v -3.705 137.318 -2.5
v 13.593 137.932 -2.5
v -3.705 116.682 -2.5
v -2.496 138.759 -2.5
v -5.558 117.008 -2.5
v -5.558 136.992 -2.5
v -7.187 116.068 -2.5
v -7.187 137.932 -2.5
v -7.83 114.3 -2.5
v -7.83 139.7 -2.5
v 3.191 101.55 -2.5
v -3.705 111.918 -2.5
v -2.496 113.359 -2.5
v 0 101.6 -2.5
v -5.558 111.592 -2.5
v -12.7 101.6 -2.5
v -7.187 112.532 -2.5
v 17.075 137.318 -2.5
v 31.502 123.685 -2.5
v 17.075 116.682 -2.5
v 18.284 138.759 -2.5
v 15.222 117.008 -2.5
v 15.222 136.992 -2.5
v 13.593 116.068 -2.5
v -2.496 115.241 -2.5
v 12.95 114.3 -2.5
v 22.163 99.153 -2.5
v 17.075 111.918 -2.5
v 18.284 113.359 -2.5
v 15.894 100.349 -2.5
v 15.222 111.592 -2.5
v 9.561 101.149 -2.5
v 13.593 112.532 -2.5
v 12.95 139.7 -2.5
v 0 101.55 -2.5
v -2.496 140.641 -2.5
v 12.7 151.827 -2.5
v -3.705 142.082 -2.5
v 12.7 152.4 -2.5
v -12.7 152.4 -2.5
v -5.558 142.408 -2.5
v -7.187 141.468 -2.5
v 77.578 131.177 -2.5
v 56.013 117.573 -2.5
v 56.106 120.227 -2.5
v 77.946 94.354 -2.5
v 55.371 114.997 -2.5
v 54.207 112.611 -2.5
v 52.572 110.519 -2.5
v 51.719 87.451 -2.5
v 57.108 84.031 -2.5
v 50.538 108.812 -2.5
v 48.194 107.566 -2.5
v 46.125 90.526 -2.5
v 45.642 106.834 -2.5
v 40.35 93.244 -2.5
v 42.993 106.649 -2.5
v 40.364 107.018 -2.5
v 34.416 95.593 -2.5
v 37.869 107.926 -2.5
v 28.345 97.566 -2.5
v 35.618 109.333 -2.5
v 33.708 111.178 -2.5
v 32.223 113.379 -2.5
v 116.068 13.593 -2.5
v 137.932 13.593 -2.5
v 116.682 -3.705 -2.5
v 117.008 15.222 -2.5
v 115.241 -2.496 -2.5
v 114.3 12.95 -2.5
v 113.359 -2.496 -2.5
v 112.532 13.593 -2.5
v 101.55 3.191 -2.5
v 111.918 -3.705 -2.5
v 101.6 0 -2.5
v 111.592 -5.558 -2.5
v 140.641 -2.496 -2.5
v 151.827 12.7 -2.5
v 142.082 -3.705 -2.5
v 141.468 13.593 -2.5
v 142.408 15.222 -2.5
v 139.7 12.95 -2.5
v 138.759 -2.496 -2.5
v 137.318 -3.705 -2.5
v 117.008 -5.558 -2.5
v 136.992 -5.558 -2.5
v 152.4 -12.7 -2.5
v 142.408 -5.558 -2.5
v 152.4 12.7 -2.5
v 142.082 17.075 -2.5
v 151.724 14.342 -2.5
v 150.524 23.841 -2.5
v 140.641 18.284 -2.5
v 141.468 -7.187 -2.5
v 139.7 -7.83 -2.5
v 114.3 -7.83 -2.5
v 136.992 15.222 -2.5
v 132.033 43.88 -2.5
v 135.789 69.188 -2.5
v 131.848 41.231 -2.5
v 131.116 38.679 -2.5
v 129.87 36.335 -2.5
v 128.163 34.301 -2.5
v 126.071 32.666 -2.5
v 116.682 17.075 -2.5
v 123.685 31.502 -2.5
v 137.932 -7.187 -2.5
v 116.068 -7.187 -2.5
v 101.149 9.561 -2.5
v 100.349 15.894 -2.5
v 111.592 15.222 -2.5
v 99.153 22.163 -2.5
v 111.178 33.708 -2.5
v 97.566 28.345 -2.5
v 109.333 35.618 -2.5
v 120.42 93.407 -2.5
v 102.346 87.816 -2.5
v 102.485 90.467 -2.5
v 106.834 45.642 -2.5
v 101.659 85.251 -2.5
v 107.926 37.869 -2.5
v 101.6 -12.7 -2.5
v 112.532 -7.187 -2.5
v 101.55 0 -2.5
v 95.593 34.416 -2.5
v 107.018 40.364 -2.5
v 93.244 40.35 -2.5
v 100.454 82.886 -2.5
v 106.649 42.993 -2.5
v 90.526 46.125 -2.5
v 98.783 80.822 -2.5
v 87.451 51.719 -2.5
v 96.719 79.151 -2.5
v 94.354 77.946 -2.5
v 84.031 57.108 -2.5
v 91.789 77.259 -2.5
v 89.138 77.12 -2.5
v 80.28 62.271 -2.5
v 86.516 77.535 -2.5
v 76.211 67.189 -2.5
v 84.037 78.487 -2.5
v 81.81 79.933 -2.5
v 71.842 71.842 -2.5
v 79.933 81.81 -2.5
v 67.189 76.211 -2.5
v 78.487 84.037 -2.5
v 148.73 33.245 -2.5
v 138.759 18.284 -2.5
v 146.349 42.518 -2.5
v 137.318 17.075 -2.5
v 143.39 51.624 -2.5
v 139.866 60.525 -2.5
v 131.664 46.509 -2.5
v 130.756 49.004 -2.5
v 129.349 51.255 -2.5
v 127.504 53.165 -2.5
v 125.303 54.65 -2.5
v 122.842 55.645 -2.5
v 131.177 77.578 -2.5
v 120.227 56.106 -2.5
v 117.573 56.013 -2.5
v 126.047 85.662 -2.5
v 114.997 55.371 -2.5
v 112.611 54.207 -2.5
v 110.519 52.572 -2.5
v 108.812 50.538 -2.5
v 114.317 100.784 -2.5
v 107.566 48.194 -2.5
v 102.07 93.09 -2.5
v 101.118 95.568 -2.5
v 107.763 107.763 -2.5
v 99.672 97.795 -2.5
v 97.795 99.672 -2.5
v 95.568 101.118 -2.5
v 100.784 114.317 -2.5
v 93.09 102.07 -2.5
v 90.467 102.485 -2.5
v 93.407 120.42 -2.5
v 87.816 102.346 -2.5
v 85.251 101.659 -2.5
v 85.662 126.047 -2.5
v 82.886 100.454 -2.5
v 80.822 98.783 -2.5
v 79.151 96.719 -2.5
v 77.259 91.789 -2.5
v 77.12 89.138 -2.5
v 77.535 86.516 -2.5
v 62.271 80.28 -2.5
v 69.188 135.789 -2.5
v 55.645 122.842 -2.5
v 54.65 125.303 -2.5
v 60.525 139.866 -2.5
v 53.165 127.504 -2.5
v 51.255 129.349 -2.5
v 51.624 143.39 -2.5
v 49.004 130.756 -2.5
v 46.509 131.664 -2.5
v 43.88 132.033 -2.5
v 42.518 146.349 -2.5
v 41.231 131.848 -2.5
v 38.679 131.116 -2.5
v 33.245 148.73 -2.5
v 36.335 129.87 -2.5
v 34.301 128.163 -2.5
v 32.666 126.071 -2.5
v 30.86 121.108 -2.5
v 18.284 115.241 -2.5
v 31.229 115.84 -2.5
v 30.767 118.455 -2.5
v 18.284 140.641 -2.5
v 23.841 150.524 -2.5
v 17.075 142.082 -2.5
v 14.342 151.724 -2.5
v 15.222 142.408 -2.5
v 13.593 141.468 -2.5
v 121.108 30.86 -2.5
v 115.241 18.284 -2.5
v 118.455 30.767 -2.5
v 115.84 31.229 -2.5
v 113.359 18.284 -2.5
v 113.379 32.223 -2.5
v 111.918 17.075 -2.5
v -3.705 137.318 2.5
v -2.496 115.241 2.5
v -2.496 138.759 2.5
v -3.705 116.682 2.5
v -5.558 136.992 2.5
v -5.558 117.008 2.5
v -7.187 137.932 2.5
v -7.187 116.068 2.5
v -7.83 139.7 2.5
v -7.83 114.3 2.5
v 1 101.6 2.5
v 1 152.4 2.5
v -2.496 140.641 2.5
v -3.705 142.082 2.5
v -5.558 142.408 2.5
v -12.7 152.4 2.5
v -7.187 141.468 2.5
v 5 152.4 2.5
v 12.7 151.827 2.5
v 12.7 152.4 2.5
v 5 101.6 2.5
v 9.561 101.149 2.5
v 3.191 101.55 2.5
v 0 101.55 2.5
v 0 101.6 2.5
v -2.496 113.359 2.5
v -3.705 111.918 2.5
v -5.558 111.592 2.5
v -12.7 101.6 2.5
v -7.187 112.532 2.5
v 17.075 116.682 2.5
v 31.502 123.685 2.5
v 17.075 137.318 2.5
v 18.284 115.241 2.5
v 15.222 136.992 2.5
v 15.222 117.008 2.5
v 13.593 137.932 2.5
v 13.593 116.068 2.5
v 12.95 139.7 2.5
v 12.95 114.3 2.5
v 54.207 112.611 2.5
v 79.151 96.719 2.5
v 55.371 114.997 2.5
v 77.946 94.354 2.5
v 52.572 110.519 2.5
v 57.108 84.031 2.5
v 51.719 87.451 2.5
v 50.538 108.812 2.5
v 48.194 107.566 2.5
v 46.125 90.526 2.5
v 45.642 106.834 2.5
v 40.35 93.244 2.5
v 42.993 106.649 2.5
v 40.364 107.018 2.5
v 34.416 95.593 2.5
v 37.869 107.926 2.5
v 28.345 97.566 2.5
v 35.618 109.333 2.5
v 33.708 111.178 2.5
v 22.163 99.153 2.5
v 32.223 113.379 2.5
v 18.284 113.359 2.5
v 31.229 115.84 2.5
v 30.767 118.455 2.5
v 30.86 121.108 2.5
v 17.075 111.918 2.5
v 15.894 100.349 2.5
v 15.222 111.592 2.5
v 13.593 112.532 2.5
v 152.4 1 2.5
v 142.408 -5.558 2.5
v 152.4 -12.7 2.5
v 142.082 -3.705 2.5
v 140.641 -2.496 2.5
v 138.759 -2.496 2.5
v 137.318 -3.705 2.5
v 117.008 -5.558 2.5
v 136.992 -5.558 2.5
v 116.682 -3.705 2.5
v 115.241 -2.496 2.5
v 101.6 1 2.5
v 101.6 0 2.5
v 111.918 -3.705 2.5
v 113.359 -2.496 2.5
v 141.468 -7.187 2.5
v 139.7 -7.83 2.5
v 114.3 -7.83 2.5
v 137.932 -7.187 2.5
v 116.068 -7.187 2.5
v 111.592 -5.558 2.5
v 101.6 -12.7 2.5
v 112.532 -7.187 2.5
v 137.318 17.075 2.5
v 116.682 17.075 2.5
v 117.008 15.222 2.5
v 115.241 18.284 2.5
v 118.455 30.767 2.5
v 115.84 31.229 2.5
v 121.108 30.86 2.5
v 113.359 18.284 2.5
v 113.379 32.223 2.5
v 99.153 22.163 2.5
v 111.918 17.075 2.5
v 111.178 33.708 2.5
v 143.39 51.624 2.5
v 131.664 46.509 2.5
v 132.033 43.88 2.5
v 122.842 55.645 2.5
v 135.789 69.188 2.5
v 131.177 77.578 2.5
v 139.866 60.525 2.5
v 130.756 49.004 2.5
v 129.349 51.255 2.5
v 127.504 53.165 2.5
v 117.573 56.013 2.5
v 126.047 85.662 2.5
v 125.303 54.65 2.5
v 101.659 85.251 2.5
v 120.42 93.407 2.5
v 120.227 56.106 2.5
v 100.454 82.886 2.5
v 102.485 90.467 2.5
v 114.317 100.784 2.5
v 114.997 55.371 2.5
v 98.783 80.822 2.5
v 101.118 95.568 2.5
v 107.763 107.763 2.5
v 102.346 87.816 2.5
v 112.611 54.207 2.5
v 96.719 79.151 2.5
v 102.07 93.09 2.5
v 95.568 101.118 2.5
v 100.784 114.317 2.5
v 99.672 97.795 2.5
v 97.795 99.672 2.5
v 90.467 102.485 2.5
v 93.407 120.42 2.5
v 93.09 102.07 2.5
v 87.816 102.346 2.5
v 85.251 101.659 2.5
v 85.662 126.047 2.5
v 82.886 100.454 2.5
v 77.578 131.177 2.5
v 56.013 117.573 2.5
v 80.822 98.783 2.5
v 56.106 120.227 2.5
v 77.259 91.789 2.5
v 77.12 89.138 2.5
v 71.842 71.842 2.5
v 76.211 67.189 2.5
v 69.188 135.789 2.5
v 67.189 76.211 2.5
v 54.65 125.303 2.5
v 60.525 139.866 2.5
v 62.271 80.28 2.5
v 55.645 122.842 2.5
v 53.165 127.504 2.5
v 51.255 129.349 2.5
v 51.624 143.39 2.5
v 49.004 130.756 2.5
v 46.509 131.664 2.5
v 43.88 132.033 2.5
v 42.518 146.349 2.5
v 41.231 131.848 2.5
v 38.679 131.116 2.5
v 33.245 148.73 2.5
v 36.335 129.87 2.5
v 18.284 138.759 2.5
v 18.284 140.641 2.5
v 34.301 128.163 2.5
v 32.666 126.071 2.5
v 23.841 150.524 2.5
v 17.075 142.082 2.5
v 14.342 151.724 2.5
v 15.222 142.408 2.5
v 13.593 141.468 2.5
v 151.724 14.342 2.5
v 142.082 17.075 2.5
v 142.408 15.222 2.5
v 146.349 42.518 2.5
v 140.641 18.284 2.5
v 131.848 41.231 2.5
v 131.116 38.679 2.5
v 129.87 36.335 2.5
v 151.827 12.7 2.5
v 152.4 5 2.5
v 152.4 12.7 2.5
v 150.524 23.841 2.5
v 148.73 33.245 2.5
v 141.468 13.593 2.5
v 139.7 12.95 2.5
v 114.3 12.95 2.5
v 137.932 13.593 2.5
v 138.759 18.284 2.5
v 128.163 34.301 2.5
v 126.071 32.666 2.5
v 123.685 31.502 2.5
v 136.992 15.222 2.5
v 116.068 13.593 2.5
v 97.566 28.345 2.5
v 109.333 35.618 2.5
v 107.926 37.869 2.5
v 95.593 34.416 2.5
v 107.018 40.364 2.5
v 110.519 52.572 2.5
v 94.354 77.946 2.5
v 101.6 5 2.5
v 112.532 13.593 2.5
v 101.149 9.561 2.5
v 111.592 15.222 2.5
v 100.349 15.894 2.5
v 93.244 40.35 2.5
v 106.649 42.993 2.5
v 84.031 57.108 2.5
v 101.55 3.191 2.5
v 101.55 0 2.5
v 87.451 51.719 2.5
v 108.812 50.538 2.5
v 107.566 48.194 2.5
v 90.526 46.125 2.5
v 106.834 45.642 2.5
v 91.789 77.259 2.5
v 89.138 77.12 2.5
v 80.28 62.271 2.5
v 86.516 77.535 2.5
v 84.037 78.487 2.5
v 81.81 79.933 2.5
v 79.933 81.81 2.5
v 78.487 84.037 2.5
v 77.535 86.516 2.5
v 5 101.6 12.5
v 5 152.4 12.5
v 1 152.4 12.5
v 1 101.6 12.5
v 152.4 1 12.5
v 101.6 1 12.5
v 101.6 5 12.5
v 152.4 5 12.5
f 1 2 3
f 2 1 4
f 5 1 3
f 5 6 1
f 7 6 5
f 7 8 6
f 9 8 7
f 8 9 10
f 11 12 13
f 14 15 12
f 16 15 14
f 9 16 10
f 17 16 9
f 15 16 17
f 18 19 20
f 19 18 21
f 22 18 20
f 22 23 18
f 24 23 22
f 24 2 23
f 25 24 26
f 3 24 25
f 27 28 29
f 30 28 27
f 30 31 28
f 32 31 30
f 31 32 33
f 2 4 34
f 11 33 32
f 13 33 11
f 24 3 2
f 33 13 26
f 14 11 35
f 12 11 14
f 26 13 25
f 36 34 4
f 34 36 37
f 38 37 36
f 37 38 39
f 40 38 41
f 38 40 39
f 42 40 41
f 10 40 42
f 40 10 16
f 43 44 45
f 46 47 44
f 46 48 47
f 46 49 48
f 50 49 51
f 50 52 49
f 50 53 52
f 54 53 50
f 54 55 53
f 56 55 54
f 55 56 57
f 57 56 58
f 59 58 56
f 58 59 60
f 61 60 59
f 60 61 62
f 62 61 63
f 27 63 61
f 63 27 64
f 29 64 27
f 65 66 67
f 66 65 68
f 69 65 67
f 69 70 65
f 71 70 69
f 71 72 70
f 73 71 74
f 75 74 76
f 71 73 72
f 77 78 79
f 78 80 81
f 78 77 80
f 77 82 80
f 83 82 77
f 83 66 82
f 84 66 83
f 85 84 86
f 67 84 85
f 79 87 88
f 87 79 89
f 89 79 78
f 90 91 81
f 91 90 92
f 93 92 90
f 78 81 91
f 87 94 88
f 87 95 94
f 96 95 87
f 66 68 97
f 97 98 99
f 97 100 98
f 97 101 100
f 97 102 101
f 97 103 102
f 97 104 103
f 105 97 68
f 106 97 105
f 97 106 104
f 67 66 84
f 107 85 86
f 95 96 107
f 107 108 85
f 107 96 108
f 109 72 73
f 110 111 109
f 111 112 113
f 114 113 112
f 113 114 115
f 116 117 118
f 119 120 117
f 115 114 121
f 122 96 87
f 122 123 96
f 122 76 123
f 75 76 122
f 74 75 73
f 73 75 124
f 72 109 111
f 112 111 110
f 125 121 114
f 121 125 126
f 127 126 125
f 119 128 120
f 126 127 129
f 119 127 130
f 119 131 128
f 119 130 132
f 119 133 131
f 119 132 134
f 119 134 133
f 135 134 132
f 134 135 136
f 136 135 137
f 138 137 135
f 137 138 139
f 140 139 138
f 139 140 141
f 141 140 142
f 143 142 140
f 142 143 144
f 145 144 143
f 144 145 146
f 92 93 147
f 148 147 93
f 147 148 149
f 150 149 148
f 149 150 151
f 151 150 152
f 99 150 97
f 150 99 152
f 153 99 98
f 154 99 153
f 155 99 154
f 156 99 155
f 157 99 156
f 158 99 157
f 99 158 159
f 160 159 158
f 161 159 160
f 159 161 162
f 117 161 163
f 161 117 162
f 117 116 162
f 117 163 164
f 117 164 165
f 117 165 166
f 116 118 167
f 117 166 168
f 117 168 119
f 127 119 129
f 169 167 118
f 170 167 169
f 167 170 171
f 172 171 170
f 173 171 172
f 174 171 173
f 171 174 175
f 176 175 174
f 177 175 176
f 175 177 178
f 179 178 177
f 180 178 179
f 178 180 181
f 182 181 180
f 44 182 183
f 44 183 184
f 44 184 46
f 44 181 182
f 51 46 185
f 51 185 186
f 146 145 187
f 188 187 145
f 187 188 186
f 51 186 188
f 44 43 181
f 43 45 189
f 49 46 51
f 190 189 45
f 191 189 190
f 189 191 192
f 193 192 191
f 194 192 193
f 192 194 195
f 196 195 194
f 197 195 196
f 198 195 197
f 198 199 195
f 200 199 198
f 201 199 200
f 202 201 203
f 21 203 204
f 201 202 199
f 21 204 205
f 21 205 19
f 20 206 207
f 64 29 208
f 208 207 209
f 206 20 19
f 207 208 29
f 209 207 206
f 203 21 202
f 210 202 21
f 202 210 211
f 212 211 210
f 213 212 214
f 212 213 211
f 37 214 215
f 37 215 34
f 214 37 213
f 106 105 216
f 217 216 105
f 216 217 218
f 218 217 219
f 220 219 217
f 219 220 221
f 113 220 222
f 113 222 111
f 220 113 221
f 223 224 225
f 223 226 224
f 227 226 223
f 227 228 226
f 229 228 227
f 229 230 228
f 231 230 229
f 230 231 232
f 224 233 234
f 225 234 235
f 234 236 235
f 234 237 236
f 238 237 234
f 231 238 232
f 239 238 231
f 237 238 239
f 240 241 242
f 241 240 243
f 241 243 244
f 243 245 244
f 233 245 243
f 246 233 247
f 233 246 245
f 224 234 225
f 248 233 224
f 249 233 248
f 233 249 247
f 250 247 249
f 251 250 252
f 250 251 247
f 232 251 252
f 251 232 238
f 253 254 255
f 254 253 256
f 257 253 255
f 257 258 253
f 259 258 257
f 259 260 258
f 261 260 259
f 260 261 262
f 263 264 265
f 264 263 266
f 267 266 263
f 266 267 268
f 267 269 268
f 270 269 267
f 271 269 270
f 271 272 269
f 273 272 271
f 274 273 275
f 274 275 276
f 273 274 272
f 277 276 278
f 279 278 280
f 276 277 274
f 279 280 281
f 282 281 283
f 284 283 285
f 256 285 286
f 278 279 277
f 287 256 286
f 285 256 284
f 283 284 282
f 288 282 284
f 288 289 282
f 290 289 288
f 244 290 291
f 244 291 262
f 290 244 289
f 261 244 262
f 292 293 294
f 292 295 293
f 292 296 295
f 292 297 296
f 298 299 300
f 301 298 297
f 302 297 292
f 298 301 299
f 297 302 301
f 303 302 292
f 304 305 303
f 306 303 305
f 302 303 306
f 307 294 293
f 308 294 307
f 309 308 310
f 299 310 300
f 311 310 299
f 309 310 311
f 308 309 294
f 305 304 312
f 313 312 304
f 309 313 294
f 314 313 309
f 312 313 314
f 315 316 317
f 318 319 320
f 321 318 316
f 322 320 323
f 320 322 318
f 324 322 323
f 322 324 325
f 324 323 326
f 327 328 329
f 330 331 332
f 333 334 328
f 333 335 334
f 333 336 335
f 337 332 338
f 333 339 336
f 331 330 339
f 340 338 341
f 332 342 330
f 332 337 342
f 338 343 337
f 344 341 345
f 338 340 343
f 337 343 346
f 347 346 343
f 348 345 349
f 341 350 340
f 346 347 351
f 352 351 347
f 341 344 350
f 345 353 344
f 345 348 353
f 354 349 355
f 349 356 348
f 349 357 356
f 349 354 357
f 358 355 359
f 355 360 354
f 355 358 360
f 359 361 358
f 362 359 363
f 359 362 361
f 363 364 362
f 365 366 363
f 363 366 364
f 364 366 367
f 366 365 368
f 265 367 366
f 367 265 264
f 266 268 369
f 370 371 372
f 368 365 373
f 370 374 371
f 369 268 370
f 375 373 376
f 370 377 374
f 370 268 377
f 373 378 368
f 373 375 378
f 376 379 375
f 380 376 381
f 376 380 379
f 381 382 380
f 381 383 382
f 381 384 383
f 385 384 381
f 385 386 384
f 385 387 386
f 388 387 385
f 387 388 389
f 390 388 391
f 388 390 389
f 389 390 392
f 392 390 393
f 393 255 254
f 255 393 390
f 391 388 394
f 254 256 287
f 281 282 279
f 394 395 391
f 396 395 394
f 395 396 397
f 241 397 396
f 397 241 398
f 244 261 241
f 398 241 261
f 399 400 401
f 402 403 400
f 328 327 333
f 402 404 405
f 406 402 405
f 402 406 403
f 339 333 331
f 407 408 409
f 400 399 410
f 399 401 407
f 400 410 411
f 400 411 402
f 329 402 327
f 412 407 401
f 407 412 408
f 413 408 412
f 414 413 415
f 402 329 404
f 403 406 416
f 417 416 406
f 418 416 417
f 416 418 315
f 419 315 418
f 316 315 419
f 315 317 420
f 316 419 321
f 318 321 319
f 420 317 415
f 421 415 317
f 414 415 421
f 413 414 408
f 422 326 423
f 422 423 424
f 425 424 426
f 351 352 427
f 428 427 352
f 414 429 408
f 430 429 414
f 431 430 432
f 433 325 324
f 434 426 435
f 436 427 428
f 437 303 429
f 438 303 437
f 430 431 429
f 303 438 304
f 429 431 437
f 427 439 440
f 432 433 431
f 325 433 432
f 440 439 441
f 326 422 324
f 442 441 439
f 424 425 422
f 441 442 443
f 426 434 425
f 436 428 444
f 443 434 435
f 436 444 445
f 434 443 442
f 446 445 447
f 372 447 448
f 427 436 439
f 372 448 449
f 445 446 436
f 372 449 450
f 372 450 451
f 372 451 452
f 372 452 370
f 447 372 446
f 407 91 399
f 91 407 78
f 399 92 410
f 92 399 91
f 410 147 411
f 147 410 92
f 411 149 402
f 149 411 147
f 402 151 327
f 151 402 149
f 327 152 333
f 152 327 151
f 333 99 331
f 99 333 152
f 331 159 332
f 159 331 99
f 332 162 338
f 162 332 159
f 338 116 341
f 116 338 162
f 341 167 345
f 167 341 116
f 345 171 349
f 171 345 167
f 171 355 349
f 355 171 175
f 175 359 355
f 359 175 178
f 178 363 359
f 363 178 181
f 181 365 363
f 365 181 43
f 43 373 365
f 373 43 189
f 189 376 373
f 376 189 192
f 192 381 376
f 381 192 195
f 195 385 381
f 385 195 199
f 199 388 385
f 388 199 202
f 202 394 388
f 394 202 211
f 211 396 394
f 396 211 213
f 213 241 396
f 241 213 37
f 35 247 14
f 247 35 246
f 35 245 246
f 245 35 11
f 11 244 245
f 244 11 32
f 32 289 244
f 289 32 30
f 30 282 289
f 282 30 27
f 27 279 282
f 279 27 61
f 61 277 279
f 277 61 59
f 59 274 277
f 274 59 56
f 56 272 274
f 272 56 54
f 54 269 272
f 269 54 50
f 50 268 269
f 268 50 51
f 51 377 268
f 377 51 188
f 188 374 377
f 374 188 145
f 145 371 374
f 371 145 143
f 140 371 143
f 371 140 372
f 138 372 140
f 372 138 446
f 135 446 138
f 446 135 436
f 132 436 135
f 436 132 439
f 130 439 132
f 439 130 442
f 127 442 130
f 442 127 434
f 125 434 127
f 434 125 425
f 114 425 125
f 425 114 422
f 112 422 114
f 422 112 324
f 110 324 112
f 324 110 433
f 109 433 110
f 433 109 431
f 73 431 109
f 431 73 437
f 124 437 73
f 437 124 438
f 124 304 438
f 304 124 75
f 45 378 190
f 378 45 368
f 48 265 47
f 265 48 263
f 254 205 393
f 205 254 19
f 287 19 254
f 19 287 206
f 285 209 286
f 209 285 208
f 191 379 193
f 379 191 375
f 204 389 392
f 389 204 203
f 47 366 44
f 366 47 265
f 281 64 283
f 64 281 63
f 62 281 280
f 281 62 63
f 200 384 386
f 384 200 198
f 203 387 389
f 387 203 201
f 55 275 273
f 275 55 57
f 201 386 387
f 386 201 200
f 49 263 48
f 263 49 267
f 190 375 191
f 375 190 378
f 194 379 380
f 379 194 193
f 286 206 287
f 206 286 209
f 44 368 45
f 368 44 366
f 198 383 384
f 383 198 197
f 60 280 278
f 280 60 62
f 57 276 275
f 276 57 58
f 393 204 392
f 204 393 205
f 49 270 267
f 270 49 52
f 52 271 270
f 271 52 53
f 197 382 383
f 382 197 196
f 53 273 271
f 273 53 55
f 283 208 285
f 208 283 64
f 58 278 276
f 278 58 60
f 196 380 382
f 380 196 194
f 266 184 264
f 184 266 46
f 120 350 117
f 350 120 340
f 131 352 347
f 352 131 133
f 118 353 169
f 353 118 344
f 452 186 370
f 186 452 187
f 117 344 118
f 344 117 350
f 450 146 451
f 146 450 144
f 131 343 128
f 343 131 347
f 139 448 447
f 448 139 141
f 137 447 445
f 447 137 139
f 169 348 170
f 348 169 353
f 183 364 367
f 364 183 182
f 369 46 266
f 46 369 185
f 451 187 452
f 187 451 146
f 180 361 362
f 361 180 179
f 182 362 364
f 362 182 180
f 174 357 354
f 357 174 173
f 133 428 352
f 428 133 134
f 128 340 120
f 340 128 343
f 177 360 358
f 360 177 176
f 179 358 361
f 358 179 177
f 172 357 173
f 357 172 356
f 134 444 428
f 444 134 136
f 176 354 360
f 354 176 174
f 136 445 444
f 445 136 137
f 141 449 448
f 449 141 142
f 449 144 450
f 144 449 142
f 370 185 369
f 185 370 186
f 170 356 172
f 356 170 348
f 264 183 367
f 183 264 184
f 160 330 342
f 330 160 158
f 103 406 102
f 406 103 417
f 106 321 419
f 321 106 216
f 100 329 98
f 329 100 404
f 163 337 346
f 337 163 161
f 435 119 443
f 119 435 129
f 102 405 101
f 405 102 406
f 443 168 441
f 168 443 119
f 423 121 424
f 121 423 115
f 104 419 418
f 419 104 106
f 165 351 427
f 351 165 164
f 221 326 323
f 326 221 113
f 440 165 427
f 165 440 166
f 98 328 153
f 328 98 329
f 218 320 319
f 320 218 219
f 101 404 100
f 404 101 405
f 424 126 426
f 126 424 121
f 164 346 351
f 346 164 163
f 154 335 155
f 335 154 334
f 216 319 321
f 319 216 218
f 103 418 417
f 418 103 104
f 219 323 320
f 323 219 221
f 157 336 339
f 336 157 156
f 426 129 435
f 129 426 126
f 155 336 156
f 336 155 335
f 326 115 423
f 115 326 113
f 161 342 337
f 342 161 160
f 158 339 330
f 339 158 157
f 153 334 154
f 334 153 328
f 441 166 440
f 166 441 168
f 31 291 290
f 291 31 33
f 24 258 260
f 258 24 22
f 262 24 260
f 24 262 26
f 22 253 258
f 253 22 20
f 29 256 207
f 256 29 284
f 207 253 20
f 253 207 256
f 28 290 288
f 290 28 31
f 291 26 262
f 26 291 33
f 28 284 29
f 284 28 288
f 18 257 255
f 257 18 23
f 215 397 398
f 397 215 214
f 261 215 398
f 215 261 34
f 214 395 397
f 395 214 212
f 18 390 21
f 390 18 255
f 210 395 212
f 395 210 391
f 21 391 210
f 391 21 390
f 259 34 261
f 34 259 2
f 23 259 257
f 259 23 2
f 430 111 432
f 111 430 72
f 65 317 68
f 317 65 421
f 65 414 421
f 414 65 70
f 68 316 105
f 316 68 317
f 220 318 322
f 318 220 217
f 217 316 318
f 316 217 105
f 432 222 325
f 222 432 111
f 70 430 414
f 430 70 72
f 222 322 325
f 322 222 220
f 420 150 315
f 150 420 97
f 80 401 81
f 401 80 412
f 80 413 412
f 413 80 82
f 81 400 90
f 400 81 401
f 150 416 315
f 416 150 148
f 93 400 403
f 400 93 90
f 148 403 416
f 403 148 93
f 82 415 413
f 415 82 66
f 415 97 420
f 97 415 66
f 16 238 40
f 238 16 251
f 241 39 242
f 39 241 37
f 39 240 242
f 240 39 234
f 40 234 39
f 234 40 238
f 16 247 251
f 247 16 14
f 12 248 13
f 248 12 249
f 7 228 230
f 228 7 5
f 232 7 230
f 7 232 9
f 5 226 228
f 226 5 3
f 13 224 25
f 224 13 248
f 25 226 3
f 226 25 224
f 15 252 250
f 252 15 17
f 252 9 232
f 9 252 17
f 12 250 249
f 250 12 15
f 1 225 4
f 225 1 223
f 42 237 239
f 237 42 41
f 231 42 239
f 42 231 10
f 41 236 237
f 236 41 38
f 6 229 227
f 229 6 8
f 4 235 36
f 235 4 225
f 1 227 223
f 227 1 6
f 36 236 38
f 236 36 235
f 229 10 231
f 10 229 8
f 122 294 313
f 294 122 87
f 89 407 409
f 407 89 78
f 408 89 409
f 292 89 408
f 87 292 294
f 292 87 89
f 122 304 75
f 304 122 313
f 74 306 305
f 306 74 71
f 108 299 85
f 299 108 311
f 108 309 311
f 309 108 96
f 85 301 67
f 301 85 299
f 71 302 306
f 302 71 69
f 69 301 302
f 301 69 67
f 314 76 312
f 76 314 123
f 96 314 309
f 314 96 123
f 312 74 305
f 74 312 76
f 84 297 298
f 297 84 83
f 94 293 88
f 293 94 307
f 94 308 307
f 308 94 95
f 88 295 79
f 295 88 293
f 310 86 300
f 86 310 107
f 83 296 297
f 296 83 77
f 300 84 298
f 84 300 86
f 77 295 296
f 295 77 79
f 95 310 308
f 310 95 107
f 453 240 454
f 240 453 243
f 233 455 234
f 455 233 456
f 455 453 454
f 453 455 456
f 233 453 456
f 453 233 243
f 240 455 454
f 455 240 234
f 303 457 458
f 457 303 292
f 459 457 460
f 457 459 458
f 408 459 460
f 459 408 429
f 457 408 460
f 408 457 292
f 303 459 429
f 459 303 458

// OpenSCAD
// Source
// https://www.thingiverse.com/thing:1092611/#files

inch = 25.4;
estowall = .067 * inch;
estosize = 1 * inch;
bsize=4;
strutsize=2;
struthole=strutsize * .25 * inch;
thickness=5;

module arc(radius, thickness, angle, fragments){
  $fn=fragments;
	intersection(){
		union(){
			rights = floor(angle/90);
			remain = angle-rights*90;
			if(angle > 90){
				for(i = [0:rights-1]){
					rotate(i*90-(rights-1)*90/2){
						polygon([[0, 0], [radius+thickness, (radius+thickness)*tan(90/2)], [radius+thickness, -(radius+thickness)*tan(90/2)]]);
					}
				}
				rotate(-(rights)*90/2)
					polygon([[0, 0], [radius+thickness, 0], [radius+thickness, -(radius+thickness)*tan(remain/2)]]);
				rotate((rights)*90/2)
					polygon([[0, 0], [radius+thickness, (radius+thickness)*tan(remain/2)], [radius+thickness, 0]]);
			}else{
				polygon([[0, 0], [radius+thickness, (radius+thickness)*tan(angle/2)], [radius+thickness, -(radius+thickness)*tan(angle/2)]]);
			}
		}
		difference(){
			circle(radius+thickness);
			circle(radius);
		}
	}
}

module brace_body(){
   rotate([0,0,45]) linear_extrude(height = thickness, center = true, convexity = 10, twist = 0) arc(bsize * inch ,strutsize * inch,90,100);
}

module mounting_ear(){
    difference(){
        translate([0,(strutsize*inch),0]) cube([estosize,strutsize*inch,thickness]);
        translate([(.5*estosize),(bsize*inch)-1.5*inch,1-thickness]) rotate([0,0,0]) cylinder(r=2.75,h=thickness+5);
        translate([(.5*estosize),(bsize*inch)-.5*inch, 1-thickness]) rotate([0,0,0]) cylinder(r=2.75,h=thickness+5);
    }    
}

module half_ear(){
    difference(){
        translate([0,(strutsize*inch),0]) cube([estosize,strutsize*inch,thickness]);
        translate([(.70*estosize),(bsize*inch)-1.5*inch,1-thickness]) rotate([0,0,0]) cylinder(r=2.75,h=thickness+5);
        translate([(.70*estosize),(bsize*inch)-.5*inch, 1-thickness]) rotate([0,0,0]) cylinder(r=2.75,h=thickness+5);
    }    
    
}

module strut(){
  difference(){
    brace_body();
    rotate([0,0,-20]) translate([0,((strutsize+3)*inch),0-estosize+5]) cylinder(r=struthole,h=estosize+10);
    rotate([0,0,-45]) translate([0,(strutsize+3)*inch,0-estosize+5]) cylinder(r=struthole,h=estosize+10);
    rotate([0,0,-70]) translate([0,(strutsize+3)*inch,0-estosize+5]) cylinder(r=struthole,h=estosize+10);
    }
}

module radius_plate(){
    strut();
    rotate([0,180,0]) translate([0,(strutsize*inch),0-(thickness/2)]) mounting_ear();
    rotate([0,0,-90]) translate([0,(strutsize*inch),0-(thickness/2)]) mounting_ear();
}

module strut_holes(){
 translate([(0-.50*estosize),(bsize*inch)-1.5*inch,1-thickness]) rotate([0,0,0]) cylinder(r=2.75,h=thickness+5);
  translate([(0-.50*estosize),(bsize*inch)-.5*inch, 1-thickness]) rotate([0,0,0]) cylinder(r=2.75,h=thickness+5);   
}

module universal_radius_plate(){
    difference(){
        strut();
        rotate([0,180,0]) translate([-3,(strutsize*inch),0-(thickness/2)]) strut_holes();
        rotate([0,0,-90]) translate([-3,(strutsize*inch),0-(thickness/2)]) strut_holes();
        }
    rotate([0,180,0]) translate([0-estosize/2,(strutsize*inch),0-(thickness/2)]) half_ear();
    rotate([0,0,-90]) translate([0-estosize/2,(strutsize*inch),0-(thickness/2)]) half_ear();
    rotate([0,180,0]) translate([0-thickness,(strutsize*inch),0-(thickness/2)])  translate([0,(strutsize*inch),-10]) cube([4,strutsize*inch,thickness+5]);
    rotate([0,0,-90])  translate([0-thickness,(strutsize*inch),0-(thickness/2)])  translate([0,(strutsize*inch),5]) cube([4,strutsize*inch,thickness+5]);
}


module midradius_plate(){
   radius_plate();
   translate([0-(estosize),0,0]) rotate([0,180,0]) radius_plate();
   }
 
universal_radius_plate();
//translate([0,0,0]) projection(cut = true) universal_radius_plate();   
//radius_plate();  
//translate([0,0,0]) projection(cut = true) radius_plate();
//midradius_plate();
//translate([0,0,0]) projection(cut = true) midradius_plate();   
